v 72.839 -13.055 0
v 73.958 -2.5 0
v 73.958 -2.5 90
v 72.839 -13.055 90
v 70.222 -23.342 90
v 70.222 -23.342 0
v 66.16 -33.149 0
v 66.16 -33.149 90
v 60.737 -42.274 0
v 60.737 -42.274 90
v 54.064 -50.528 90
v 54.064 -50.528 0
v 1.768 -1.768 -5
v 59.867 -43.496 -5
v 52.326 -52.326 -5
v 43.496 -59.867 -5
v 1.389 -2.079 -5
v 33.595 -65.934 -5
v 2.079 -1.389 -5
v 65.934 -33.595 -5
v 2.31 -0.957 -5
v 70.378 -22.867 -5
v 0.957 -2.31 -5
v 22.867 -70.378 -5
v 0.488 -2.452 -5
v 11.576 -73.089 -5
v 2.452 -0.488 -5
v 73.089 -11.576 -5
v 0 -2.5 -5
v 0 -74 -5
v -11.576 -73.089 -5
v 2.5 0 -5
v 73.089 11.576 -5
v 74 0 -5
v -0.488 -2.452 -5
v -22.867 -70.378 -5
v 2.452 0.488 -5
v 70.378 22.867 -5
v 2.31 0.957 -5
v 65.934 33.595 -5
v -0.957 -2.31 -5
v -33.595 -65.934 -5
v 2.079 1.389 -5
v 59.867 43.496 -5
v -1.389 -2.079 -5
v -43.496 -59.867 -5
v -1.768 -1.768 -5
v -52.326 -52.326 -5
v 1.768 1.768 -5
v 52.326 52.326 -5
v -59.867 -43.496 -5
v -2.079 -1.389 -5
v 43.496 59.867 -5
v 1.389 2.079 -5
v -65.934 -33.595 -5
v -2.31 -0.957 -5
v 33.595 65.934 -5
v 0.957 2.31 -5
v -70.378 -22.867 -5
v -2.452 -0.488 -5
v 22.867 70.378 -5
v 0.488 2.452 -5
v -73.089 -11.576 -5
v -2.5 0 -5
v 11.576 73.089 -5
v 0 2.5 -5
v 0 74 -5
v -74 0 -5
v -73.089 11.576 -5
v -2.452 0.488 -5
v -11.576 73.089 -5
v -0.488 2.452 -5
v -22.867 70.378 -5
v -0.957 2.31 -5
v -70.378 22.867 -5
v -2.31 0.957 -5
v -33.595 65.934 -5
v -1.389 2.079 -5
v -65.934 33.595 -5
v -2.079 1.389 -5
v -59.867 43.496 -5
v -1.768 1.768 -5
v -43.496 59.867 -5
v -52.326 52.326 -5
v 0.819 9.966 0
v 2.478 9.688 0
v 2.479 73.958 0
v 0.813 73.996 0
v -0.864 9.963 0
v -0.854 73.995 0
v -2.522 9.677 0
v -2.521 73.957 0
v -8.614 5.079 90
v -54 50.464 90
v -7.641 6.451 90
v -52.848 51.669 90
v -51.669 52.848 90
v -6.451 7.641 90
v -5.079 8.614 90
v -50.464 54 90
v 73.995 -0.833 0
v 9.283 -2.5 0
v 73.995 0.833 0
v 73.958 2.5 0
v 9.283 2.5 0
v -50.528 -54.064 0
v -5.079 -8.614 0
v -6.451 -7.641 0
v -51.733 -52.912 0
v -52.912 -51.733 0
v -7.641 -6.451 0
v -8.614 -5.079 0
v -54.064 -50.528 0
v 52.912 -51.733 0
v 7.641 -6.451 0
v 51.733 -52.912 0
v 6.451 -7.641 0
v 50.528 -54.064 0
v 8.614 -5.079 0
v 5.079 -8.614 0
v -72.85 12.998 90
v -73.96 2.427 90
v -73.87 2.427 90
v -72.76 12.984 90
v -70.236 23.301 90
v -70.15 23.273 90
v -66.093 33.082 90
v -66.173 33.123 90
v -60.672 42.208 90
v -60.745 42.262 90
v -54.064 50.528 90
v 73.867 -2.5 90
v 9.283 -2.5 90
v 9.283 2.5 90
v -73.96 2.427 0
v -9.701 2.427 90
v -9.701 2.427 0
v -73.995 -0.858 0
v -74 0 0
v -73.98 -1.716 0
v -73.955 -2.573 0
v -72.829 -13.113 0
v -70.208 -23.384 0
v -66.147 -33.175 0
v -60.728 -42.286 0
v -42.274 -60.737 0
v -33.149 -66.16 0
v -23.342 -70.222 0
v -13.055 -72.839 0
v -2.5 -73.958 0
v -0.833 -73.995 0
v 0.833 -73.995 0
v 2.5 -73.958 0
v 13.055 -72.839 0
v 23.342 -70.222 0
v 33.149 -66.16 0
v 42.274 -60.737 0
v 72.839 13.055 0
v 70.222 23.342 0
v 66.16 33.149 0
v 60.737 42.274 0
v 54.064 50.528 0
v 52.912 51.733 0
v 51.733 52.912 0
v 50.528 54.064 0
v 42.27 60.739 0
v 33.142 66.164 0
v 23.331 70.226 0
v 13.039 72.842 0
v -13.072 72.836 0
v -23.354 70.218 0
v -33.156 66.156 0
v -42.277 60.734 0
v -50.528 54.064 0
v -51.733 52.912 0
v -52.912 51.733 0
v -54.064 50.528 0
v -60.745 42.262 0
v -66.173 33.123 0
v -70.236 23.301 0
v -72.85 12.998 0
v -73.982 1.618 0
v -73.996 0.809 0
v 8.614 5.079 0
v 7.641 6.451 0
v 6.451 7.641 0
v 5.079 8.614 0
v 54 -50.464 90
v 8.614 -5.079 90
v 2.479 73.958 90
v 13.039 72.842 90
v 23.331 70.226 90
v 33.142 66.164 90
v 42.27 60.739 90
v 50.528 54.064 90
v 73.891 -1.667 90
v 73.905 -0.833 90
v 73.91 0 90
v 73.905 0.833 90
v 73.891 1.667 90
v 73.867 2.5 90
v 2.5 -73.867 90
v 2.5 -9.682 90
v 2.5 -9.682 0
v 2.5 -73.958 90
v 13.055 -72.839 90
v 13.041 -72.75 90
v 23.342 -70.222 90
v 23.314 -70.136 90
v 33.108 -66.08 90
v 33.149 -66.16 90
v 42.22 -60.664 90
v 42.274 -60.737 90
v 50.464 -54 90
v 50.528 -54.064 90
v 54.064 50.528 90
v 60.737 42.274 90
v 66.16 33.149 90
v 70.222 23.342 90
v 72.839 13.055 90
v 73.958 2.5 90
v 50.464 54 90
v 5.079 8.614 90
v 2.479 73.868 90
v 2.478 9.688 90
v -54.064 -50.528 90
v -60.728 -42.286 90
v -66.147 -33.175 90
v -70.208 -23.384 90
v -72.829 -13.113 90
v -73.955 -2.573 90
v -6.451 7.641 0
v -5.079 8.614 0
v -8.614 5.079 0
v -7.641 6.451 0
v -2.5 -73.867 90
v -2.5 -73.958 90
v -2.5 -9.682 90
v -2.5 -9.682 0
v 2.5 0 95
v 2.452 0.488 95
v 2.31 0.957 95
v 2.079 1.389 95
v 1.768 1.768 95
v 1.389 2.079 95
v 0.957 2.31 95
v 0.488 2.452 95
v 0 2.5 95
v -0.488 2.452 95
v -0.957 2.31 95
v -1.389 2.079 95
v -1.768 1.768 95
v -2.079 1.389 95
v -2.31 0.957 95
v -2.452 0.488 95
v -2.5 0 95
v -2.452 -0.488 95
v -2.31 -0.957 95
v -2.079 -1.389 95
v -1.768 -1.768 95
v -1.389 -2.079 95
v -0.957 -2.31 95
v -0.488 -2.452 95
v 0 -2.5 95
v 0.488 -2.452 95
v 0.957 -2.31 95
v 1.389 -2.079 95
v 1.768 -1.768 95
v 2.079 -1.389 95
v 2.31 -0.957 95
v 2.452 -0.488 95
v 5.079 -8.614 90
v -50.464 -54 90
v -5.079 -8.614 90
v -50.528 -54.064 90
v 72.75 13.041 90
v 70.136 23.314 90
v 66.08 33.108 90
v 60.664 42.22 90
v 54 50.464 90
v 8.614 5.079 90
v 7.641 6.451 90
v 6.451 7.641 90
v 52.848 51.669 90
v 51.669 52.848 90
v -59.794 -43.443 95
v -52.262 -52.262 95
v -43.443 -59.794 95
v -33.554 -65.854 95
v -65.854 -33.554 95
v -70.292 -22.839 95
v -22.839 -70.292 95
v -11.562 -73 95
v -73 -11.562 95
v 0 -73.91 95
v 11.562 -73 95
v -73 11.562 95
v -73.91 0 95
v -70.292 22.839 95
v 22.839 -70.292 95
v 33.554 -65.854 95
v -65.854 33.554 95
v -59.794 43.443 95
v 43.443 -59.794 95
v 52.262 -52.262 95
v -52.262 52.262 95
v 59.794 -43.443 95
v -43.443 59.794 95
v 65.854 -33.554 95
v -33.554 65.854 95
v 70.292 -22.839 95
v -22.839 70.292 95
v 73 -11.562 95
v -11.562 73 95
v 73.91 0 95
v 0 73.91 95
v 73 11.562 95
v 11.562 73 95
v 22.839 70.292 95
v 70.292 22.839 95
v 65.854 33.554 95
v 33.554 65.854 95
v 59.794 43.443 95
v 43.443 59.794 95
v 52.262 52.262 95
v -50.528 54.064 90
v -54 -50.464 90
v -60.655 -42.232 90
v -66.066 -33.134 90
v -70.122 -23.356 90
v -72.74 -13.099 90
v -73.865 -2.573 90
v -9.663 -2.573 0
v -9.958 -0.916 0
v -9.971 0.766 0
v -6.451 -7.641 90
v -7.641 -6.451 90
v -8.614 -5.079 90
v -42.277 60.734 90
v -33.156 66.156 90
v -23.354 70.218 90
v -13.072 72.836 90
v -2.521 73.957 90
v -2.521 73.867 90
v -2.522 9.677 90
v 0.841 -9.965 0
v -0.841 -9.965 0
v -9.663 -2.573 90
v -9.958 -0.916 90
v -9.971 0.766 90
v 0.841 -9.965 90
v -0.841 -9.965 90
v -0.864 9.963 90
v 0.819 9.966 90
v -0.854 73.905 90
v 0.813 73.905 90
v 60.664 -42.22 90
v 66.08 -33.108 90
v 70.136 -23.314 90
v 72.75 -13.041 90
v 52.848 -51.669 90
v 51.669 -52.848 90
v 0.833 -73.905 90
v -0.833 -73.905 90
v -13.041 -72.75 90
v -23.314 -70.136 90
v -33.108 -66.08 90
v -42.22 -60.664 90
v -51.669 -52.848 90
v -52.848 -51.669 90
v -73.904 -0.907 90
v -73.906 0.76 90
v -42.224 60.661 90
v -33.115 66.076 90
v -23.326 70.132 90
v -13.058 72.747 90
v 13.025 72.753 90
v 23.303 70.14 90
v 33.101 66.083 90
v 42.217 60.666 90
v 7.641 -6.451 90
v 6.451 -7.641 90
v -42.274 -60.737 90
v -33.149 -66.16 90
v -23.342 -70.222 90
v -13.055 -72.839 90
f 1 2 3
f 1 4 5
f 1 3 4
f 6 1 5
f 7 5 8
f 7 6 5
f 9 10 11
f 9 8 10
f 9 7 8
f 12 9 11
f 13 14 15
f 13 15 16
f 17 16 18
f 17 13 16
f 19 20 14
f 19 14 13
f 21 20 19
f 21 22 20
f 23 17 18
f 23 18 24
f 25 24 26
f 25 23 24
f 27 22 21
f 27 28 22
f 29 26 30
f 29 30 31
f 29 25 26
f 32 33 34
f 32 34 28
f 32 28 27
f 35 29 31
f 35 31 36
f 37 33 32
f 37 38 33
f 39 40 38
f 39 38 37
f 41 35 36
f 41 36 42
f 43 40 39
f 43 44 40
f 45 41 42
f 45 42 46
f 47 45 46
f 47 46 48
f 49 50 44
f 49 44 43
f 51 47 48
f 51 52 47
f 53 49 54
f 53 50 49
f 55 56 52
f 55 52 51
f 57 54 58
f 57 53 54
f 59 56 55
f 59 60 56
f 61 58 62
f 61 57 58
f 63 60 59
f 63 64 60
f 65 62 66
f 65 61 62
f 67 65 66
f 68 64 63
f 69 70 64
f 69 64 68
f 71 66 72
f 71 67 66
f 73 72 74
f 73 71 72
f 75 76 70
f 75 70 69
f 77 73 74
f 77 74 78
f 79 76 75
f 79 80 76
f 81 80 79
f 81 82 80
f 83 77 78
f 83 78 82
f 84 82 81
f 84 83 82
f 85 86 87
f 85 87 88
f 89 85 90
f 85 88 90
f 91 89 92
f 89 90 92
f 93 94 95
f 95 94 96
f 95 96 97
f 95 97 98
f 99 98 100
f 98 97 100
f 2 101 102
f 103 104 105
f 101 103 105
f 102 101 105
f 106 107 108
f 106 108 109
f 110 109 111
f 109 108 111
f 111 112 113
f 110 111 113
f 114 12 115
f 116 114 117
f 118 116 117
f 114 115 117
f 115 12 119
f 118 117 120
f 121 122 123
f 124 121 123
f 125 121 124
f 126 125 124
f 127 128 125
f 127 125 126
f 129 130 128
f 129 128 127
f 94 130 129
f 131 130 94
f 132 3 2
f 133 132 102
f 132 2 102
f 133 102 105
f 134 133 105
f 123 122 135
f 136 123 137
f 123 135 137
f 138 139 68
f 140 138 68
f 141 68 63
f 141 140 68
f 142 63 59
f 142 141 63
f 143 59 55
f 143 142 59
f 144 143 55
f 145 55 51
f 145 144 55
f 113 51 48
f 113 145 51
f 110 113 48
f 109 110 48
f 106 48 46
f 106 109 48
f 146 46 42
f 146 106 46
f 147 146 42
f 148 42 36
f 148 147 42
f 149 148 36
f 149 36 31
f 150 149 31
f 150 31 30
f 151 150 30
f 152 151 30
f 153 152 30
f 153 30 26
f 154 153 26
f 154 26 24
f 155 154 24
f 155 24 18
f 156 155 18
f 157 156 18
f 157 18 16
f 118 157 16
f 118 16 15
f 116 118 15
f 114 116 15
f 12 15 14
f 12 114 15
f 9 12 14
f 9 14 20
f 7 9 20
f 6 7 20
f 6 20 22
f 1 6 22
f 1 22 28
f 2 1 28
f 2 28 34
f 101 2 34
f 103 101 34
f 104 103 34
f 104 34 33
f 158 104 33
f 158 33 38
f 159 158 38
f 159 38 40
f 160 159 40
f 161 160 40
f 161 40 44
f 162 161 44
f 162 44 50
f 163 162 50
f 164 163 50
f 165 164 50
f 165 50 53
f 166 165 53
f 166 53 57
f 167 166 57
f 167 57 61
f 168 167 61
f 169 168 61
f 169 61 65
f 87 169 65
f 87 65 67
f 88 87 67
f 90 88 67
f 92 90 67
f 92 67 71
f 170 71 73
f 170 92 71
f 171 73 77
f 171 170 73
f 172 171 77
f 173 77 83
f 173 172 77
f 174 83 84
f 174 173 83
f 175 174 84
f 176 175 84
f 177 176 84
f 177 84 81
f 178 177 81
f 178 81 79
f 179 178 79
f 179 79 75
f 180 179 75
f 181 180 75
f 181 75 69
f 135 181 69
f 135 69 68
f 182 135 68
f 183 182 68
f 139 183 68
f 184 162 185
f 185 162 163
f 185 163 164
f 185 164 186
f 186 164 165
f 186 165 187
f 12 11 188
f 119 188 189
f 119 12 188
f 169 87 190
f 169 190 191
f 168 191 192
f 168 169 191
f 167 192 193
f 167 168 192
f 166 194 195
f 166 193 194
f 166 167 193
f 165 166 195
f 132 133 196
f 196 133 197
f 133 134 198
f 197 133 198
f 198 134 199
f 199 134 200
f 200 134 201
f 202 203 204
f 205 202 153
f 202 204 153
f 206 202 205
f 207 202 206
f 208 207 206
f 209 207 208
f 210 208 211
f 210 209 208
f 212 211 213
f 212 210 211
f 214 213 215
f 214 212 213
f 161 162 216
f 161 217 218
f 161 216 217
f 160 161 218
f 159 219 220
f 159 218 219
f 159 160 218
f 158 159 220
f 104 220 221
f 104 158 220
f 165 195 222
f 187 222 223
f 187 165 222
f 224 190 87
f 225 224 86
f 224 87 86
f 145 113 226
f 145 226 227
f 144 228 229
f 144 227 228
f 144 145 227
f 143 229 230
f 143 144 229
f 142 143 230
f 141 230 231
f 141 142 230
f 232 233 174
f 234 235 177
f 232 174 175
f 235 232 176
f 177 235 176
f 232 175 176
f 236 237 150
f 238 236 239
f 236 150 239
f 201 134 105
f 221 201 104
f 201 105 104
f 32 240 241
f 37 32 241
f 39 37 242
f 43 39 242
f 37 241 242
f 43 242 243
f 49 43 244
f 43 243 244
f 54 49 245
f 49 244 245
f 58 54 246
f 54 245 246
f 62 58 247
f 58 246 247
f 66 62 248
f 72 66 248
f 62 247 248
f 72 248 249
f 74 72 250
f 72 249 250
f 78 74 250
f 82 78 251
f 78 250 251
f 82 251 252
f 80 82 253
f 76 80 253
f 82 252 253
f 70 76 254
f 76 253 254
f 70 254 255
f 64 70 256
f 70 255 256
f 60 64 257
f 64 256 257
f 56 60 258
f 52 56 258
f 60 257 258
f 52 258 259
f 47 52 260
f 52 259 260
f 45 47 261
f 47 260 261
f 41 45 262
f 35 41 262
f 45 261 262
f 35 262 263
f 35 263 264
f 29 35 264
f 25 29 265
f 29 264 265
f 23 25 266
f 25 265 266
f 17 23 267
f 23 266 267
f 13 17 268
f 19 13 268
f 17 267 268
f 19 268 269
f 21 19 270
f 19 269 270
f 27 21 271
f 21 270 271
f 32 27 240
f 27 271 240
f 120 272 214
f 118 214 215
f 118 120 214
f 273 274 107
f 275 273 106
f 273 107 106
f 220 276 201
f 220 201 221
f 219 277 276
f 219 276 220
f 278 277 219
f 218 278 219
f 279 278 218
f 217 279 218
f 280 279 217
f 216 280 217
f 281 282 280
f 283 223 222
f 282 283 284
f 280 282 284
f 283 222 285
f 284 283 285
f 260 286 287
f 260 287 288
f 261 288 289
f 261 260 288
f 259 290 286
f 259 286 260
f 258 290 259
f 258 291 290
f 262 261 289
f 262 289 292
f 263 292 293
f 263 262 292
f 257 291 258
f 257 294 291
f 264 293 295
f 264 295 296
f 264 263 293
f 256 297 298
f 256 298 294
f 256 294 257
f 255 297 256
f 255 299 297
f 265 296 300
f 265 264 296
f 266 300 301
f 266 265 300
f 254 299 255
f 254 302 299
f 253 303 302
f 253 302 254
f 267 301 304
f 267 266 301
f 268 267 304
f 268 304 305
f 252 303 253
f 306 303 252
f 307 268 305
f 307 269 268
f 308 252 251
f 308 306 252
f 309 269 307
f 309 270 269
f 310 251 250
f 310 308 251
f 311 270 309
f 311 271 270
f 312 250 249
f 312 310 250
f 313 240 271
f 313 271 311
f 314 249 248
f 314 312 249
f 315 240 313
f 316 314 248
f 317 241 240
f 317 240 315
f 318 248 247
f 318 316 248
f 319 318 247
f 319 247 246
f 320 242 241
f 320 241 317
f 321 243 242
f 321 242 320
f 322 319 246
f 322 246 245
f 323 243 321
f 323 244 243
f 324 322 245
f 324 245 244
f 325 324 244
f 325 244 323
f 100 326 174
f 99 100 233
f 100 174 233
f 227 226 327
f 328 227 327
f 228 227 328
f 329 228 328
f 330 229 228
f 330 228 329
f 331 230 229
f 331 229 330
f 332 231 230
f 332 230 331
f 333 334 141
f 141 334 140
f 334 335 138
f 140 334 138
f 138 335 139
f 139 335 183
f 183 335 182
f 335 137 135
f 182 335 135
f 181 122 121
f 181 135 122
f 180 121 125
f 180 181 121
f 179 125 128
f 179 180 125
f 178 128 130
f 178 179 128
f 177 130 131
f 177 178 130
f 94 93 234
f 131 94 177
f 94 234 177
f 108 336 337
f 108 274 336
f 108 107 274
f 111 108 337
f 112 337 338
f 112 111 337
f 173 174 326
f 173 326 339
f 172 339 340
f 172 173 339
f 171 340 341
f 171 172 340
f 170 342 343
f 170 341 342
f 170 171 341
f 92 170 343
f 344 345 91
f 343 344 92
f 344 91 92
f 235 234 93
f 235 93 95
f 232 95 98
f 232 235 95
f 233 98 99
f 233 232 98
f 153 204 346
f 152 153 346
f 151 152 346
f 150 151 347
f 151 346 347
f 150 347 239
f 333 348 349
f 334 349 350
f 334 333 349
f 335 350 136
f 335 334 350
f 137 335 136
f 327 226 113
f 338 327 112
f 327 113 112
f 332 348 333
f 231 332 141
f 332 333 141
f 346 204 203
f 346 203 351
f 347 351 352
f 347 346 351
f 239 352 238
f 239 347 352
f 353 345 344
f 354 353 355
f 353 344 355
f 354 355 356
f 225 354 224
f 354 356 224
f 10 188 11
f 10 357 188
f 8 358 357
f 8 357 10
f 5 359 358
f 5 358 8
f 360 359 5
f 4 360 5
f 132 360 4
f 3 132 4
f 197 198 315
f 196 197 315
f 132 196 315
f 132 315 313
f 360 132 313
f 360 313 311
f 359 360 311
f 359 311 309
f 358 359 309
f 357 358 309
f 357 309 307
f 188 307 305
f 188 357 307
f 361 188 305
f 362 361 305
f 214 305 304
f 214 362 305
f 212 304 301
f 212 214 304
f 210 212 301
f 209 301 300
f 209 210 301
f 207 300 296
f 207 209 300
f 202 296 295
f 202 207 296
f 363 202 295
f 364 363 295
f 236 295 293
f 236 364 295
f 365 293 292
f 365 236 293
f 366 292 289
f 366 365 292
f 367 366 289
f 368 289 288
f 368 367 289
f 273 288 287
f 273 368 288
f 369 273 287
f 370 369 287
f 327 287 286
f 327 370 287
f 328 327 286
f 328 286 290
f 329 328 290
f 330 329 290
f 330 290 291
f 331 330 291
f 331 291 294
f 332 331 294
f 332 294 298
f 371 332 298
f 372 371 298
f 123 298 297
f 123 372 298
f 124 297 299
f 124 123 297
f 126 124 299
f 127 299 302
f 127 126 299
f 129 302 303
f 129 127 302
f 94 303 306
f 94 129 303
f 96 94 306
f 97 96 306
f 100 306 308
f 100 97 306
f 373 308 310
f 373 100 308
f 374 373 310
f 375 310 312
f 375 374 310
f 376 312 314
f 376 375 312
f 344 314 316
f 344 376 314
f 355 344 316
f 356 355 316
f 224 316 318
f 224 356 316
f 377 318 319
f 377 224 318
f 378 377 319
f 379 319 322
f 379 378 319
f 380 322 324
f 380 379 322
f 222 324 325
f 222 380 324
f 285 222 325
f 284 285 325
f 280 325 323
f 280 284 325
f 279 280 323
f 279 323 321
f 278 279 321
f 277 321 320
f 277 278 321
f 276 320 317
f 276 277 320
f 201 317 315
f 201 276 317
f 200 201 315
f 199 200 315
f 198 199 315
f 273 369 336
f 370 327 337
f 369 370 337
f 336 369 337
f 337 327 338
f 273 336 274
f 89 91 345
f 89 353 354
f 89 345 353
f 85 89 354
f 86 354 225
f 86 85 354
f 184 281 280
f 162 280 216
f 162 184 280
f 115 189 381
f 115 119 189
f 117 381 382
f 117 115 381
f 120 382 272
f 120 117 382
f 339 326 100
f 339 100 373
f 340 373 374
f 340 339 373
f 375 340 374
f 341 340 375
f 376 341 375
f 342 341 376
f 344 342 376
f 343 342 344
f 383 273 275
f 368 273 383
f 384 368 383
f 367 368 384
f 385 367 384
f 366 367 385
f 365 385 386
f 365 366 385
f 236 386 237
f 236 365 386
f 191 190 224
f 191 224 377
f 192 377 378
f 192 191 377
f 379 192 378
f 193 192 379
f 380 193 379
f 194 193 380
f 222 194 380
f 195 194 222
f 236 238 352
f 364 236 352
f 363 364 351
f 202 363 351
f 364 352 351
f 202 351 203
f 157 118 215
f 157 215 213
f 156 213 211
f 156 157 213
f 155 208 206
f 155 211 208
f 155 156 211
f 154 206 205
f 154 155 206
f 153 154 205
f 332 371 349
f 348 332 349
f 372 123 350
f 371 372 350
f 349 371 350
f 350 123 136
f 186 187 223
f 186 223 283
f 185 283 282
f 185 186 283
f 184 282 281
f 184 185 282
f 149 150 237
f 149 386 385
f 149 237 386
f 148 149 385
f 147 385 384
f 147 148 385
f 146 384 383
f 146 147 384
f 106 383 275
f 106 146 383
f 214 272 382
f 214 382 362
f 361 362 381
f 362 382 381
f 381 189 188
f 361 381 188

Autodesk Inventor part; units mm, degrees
ref_plane "YZ Plane" through (0, 0, 0) normal (1, 0, 0) x (0, 1, 0)
ref_plane "XZ Plane" through (0, 0, 0) normal (0, 1, 0) x (-1, 0, 0)
ref_plane "XY Plane" through (0, 0, 0) normal (0, 0, 1) x (1, 0, 0)
sketch "Sketch1" plane through (0, 0, 0) normal (0, 0, 1) x (1, 0, 0)
  point P0 (0, 0)
sketch "Sketch2" plane through (0, 0, 0) normal (0, 0, 1) x (1, 0, 0)
  circle A0 centre (0, 0) radius 10
  line L0 (2.4793, 73.9585) -> (2.4781, 9.6881)
  line L1 (-2.5359, 9.6731) -> (-2.5218, 9.6731)
  line L2 (-2.5218, 9.6768) -> (-2.5207, 73.9571)
  line L3 (-2.4922, 73.958) -> (2.4781, 9.6881) construction
  line L4 (2.4804, 74.3269) -> (-2.5218, 9.6731) construction
  line L5 (-2.5218, 9.6731) -> (-2.5218, 9.6723)
  line L6 (9.283, 2.5) -> (74.717, 2.5)
  line L7 (74.717, 2.5) -> (74.717, -2.5)
  line L8 (74.717, -2.5) -> (9.283, -2.5)
  line L9 (9.283, -2.5) -> (9.283, 2.5)
  line L10 (9.283, 2.5) -> (74.717, -2.5) construction
  line L11 (74.717, 2.5) -> (9.283, -2.5) construction
  line L12 (2.4778, -7.9438) -> (2.5, -7.9438)
  line L13 (2.5, -9.6825) -> (2.5, -73.9578)
  line L14 (2.5, -76.0562) -> (2.4766, -76.0562)
  line L15 (-2.5, -73.9578) -> (-2.5, -9.6825)
  line L16 (-2.5, -7.9438) -> (2.5, -76.0562) construction
  line L17 (2.5, -7.9438) -> (-2.5, -76.0562) construction
  line L18 (-73.9602, 2.427) -> (-9.701, 2.427)
  line L19 (-8.7479, -2.5) -> (-8.7479, -2.573)
  line L20 (-9.6633, -2.573) -> (-73.9553, -2.573)
  line L21 (-75.2519, -2.573) -> (-75.2519, -2.5)
  line L22 (-75.2519, 2.427) -> (-8.7479, -2.573) construction
  line L23 (-8.7479, 2.427) -> (-75.2519, -2.573) construction
  line L24 (50.5283, 54.0638) -> (5.0788, 8.6143)
  line L25 (-1.7678, 1.7678) -> (1.7678, -1.7678)
  line L26 (8.6143, 5.0788) -> (54.0638, 50.5283)
  line L27 (53.4417, 51.1858) -> (5.5504, 8.3182) construction
  line L28 (39.6303, -7.8699) -> (34.6303, 82.4585) construction
  line L29 (-54.0638, -50.5283) -> (-8.6143, -5.0788)
  line L30 (-1.7678, 1.7678) -> (1.7678, -1.7678)
  line L31 (-5.0788, -8.6143) -> (-50.5283, -54.0638)
  line L32 (-51.9756, -52.6739) -> (-8.4008, -5.4246) construction
  line L33 (-52.6739, -51.9756) -> (-5.4246, -8.4008) construction
  arc A1 (73.9597, 2.4421) -> (53.4417, 51.1858) centre (0, 0) ccw
  arc A2 (50.5283, 54.0638) -> (2.452, 73.9594) centre (0, 0) ccw
  arc A3 (-73.9586, -2.4757) -> (-54.0638, -50.5283) centre (0, 0) ccw
  arc A4 (-50.5283, -54.0638) -> (-2.3463, -73.9628) centre (0, 0) ccw
  line L34 (-50.5283, 54.0638) -> (-5.0788, 8.6143)
  line L35 (1.7678, 1.7678) -> (0, 0)
  line L36 (-8.6143, 5.0788) -> (-54.0638, 50.5283)
  line L37 (-84.1138, 80.5783) -> (-5.4456, 8.3872) construction
  line L38 (-80.5783, 84.1138) -> (-1.7678, -1.7678) construction
  arc A5 (-2.4922, 73.958) -> (-50.5283, 54.0638) centre (0, 0) ccw
  arc A6 (-54.0638, 50.5283) -> (-73.9633, 2.3301) centre (0, 0) ccw
  line L39 (5.0788, -8.6143) -> (50.5283, -54.0638)
  line L40 (79.0888, -76.0562) -> (79.3403, -75.8047)
  line L41 (54.0638, -50.5283) -> (8.6143, -5.0788)
  line L42 (1.7678, 1.7678) -> (75.8047, -79.3403) construction
  line L43 (-1.7678, -1.7678) -> (79.3403, -75.8047) construction
  arc A7 (2.3463, -73.9628) -> (50.5283, -54.0638) centre (0, 0) ccw
  arc A8 (54.0638, -50.5283) -> (73.9597, -2.4421) centre (0, 0) ccw
  point P0 (-0.0207, 42)
  point P1 (-0.0207, 74.3122)
  point P2 (42, 0)
  point P3 (0, -42)
  point P4 (-41.9999, -0.073)
  point P5 (37.1303, 37.2943)
  point P6 (-43.6953, -43.6953)
  point P7 (-41.173, 41.173)
  point P8 (38.7862, -38.7862)
  point P9 (73.9578, -2.5)
  point P10 (73.9578, 2.5)
  dimension "d1" = 20
  dimension "d3" = 5
  dimension "d4" = 65.434
  dimension "d5" = 5
  dimension "d6" = 5
  dimension "d7" = 66.504
  dimension "d8" = 5
  dimension "d9" = 5
  dimension "d10" = 5
  dimension "d11" = 5
  dimension "d12" = 5
extrude "Extrusion1" add sketch "Sketch2" along normal blind 90 contours A0 L6 L9 L8 | L26 A1 L6 A0 | A0 L0 A2 L24 | A0 L34 A5 L2 | L8 A8 L41 A0 | L39 A7 L13 A0 | A0 L18 A6 L36 | L15 A4 L31 A0 | A0 L29 A3 L20 picked at (2.8651, 0.2554)
sketch "Sketch3" plane through (0, 0, 0) normal (0, 0, -1) x (-1, 0, 0)
  circle A0 centre (0, 0) radius 74
extrude "Extrusion2" add sketch "Sketch3" along normal blind 5
sketch "Sketch4" plane through (0, 0, 90) normal (0, 0, 1) x (1, 0, 0)
  circle A0 centre (0, 0) radius 73.9097
extrude "Extrusion3" add sketch "Sketch4" along normal blind 5
sketch "Sketch5" plane through (0, 0, 95) normal (0, 0, 1) x (1, 0, 0)
  circle A0 centre (0, 0) radius 2.5
  dimension "d19" = 5
extrude "Extrusion4" cut sketch "Sketch5" against normal through all
